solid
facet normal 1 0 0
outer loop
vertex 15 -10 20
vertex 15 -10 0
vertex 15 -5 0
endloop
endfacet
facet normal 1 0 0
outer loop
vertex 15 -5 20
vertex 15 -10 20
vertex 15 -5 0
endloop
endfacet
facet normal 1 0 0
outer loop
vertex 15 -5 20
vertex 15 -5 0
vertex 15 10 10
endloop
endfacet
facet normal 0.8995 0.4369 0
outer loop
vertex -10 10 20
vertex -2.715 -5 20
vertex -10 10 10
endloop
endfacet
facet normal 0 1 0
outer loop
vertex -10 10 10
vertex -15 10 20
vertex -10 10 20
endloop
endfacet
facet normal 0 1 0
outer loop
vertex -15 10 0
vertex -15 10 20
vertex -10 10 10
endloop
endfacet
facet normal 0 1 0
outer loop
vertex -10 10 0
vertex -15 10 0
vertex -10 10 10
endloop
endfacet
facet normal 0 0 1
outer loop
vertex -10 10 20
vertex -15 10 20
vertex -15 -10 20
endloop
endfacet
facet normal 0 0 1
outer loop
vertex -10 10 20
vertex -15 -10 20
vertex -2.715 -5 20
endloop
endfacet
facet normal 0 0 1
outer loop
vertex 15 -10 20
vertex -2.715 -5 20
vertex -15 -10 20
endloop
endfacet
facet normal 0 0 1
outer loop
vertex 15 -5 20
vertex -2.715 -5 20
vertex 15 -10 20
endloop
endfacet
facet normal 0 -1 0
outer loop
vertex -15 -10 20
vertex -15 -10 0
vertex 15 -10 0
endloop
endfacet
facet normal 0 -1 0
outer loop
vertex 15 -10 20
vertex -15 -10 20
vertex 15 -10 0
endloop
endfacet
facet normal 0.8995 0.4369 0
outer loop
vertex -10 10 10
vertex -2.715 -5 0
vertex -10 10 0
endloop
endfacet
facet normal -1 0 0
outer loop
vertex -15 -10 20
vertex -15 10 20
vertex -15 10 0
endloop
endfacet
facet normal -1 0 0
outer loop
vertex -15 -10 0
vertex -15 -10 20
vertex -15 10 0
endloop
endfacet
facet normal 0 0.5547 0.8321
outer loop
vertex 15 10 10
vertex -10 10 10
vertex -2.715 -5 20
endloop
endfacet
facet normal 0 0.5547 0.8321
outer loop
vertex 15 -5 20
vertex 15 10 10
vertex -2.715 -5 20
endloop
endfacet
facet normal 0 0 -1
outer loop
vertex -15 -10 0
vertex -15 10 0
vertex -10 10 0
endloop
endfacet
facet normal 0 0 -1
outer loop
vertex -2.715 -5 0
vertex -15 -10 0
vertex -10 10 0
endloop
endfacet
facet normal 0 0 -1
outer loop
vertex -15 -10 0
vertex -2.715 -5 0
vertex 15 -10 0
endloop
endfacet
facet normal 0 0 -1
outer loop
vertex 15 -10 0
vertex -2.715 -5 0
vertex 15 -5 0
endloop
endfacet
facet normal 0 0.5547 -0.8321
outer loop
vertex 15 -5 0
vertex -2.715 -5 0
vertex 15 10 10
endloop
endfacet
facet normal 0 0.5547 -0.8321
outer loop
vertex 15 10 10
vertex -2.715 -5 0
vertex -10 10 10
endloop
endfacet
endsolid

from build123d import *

# Parameters (mm, degrees)
SKETCH_1_W          = 30
SKETCH_1_H          = 20
EXTRUDE_1_DEPTH     = 20
CUT_EXTRUDE_4_DEPTH = 27.925824036
EXTRUDE_6_DEPTH     = 30


with BuildPart() as part:
    # 草圖1 → 填料-伸長1 (new body)
    with BuildSketch(Plane.XY):
        Rectangle(SKETCH_1_W, SKETCH_1_H)
    extrude(amount=EXTRUDE_1_DEPTH)

    # 草圖10 → 除料-伸長4 (cut, through all)
    with BuildSketch(Plane(origin=(0, 0, 0), x_dir=(-1, 0, 0), z_dir=(0, 0, -1))):
        Polygon((-15, -5), (2.714610503, -5), (10, 10), (-15, 10), align=None)
    extrude(amount=-CUT_EXTRUDE_4_DEPTH, mode=Mode.SUBTRACT)

    # 草圖11 → 填料-伸長6 (add)
    with BuildSketch(Plane.ZY.offset(15)):
        Polygon((0, -5), (10, 10), (20, -5), align=None)
    extrude(amount=-EXTRUDE_6_DEPTH)


solid = part.part
